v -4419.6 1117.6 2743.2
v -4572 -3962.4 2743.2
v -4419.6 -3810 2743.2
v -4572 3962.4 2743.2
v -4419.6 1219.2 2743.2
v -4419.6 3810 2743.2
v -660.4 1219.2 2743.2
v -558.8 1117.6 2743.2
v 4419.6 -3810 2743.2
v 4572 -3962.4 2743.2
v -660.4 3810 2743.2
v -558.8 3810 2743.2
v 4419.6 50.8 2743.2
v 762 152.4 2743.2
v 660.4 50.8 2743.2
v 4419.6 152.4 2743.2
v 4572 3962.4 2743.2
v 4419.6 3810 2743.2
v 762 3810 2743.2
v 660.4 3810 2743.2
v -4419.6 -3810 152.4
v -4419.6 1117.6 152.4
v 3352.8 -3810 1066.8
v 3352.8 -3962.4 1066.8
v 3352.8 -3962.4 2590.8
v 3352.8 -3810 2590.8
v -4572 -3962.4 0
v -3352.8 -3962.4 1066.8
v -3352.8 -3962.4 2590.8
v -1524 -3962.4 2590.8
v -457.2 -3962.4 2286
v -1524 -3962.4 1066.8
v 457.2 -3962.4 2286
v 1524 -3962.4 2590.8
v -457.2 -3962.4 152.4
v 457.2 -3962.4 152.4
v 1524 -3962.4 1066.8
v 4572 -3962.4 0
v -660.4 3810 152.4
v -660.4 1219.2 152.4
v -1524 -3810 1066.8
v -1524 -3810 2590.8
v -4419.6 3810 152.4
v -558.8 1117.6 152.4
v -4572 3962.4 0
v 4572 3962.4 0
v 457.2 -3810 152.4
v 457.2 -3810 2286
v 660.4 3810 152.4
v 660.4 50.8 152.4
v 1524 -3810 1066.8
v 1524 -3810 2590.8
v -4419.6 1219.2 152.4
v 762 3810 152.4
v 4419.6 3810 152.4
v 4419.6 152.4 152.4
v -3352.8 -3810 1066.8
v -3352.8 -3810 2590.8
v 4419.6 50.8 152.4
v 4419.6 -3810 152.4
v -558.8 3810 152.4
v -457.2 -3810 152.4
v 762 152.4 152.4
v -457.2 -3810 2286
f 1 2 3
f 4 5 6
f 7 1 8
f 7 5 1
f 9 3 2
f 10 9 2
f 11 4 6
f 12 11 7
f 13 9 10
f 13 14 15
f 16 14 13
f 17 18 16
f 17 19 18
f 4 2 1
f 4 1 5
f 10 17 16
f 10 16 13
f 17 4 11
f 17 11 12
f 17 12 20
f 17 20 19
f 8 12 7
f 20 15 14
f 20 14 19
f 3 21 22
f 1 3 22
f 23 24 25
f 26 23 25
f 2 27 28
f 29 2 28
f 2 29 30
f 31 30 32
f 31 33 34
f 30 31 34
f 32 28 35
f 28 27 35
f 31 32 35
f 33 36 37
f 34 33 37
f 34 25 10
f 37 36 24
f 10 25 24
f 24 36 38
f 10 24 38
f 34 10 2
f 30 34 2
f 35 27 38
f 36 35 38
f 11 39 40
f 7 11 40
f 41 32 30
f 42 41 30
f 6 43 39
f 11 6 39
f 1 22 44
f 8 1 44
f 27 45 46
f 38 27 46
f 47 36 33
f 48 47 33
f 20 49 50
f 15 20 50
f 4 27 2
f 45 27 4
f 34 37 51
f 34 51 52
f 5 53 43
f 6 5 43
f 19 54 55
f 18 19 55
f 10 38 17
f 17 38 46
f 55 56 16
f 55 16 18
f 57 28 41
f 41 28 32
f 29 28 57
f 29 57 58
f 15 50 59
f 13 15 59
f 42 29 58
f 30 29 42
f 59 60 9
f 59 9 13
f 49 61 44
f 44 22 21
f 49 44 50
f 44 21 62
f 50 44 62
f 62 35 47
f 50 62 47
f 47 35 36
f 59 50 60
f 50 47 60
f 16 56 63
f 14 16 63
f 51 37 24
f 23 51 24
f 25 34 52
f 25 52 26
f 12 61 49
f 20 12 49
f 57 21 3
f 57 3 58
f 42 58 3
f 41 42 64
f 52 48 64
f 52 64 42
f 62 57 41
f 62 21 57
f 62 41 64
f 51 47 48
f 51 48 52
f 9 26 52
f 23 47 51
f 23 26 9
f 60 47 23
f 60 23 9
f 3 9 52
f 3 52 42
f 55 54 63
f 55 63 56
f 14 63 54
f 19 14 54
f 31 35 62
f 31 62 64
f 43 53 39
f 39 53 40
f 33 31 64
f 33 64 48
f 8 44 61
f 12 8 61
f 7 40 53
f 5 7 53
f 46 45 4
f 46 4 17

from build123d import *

# Parameters (mm, degrees)
F0_W     = 9144
F0_H     = 7924.8
F1_DEPTH = 2743.2
F2_T     = -152.4
F3_W     = 914.4
F3_H     = 2133.6
F3_W_2   = 2438.4
F3_H_2   = 2438.4
F3_W_3   = 1828.8
F3_H_3   = 1524
F4_DEPTH = 152.4
F6_DEPTH = 2590.8


with BuildPart() as f1:
    # F0 (on Top) → F1 (new body)
    with BuildSketch(Plane.XY):
        Rectangle(F0_W, F0_H)
    extrude(amount=F1_DEPTH)

    # F2
    f2_openings = [f1.faces().sort_by_distance(p)[0] for p in [
        (0, 0, 2743.2),
    ]]
    offset(amount=F2_T, openings=f2_openings)

    # F3 (on face) → F4 (cut, through all)
    with BuildSketch(Plane.XZ.offset(3962.4)):
        with Locations((0, 1219.2)):
            Rectangle(F3_W, F3_H)
        with Locations((-2133.6, 4876.8)):
            Rectangle(F3_W_2, F3_H_2)
        with Locations((2133.6, 4876.8)):
            Rectangle(F3_W_2, F3_H_2)
        with Locations((-2438.4, 1828.8)):
            Rectangle(F3_W_3, F3_H_3)
        with Locations((2438.4, 1828.8)):
            Rectangle(F3_W_3, F3_H_3)
    extrude(amount=-F4_DEPTH, mode=Mode.SUBTRACT)

    # F5 (on face) → F6 (join, through all)
    with BuildSketch(Plane.XY.offset(152.4)):
        Polygon((660.4, 50.8), (4419.6, 50.8), (4419.6, 152.4), (762, 152.4), (762, 3810), (660.4, 3810), align=None)
        Polygon((-558.8, 1117.6), (-558.8, 3810), (-660.4, 3810), (-660.4, 1219.2), (-4419.6, 1219.2), (-4419.6, 1117.6), align=None)
    extrude(amount=F6_DEPTH)


solid = f1.part
